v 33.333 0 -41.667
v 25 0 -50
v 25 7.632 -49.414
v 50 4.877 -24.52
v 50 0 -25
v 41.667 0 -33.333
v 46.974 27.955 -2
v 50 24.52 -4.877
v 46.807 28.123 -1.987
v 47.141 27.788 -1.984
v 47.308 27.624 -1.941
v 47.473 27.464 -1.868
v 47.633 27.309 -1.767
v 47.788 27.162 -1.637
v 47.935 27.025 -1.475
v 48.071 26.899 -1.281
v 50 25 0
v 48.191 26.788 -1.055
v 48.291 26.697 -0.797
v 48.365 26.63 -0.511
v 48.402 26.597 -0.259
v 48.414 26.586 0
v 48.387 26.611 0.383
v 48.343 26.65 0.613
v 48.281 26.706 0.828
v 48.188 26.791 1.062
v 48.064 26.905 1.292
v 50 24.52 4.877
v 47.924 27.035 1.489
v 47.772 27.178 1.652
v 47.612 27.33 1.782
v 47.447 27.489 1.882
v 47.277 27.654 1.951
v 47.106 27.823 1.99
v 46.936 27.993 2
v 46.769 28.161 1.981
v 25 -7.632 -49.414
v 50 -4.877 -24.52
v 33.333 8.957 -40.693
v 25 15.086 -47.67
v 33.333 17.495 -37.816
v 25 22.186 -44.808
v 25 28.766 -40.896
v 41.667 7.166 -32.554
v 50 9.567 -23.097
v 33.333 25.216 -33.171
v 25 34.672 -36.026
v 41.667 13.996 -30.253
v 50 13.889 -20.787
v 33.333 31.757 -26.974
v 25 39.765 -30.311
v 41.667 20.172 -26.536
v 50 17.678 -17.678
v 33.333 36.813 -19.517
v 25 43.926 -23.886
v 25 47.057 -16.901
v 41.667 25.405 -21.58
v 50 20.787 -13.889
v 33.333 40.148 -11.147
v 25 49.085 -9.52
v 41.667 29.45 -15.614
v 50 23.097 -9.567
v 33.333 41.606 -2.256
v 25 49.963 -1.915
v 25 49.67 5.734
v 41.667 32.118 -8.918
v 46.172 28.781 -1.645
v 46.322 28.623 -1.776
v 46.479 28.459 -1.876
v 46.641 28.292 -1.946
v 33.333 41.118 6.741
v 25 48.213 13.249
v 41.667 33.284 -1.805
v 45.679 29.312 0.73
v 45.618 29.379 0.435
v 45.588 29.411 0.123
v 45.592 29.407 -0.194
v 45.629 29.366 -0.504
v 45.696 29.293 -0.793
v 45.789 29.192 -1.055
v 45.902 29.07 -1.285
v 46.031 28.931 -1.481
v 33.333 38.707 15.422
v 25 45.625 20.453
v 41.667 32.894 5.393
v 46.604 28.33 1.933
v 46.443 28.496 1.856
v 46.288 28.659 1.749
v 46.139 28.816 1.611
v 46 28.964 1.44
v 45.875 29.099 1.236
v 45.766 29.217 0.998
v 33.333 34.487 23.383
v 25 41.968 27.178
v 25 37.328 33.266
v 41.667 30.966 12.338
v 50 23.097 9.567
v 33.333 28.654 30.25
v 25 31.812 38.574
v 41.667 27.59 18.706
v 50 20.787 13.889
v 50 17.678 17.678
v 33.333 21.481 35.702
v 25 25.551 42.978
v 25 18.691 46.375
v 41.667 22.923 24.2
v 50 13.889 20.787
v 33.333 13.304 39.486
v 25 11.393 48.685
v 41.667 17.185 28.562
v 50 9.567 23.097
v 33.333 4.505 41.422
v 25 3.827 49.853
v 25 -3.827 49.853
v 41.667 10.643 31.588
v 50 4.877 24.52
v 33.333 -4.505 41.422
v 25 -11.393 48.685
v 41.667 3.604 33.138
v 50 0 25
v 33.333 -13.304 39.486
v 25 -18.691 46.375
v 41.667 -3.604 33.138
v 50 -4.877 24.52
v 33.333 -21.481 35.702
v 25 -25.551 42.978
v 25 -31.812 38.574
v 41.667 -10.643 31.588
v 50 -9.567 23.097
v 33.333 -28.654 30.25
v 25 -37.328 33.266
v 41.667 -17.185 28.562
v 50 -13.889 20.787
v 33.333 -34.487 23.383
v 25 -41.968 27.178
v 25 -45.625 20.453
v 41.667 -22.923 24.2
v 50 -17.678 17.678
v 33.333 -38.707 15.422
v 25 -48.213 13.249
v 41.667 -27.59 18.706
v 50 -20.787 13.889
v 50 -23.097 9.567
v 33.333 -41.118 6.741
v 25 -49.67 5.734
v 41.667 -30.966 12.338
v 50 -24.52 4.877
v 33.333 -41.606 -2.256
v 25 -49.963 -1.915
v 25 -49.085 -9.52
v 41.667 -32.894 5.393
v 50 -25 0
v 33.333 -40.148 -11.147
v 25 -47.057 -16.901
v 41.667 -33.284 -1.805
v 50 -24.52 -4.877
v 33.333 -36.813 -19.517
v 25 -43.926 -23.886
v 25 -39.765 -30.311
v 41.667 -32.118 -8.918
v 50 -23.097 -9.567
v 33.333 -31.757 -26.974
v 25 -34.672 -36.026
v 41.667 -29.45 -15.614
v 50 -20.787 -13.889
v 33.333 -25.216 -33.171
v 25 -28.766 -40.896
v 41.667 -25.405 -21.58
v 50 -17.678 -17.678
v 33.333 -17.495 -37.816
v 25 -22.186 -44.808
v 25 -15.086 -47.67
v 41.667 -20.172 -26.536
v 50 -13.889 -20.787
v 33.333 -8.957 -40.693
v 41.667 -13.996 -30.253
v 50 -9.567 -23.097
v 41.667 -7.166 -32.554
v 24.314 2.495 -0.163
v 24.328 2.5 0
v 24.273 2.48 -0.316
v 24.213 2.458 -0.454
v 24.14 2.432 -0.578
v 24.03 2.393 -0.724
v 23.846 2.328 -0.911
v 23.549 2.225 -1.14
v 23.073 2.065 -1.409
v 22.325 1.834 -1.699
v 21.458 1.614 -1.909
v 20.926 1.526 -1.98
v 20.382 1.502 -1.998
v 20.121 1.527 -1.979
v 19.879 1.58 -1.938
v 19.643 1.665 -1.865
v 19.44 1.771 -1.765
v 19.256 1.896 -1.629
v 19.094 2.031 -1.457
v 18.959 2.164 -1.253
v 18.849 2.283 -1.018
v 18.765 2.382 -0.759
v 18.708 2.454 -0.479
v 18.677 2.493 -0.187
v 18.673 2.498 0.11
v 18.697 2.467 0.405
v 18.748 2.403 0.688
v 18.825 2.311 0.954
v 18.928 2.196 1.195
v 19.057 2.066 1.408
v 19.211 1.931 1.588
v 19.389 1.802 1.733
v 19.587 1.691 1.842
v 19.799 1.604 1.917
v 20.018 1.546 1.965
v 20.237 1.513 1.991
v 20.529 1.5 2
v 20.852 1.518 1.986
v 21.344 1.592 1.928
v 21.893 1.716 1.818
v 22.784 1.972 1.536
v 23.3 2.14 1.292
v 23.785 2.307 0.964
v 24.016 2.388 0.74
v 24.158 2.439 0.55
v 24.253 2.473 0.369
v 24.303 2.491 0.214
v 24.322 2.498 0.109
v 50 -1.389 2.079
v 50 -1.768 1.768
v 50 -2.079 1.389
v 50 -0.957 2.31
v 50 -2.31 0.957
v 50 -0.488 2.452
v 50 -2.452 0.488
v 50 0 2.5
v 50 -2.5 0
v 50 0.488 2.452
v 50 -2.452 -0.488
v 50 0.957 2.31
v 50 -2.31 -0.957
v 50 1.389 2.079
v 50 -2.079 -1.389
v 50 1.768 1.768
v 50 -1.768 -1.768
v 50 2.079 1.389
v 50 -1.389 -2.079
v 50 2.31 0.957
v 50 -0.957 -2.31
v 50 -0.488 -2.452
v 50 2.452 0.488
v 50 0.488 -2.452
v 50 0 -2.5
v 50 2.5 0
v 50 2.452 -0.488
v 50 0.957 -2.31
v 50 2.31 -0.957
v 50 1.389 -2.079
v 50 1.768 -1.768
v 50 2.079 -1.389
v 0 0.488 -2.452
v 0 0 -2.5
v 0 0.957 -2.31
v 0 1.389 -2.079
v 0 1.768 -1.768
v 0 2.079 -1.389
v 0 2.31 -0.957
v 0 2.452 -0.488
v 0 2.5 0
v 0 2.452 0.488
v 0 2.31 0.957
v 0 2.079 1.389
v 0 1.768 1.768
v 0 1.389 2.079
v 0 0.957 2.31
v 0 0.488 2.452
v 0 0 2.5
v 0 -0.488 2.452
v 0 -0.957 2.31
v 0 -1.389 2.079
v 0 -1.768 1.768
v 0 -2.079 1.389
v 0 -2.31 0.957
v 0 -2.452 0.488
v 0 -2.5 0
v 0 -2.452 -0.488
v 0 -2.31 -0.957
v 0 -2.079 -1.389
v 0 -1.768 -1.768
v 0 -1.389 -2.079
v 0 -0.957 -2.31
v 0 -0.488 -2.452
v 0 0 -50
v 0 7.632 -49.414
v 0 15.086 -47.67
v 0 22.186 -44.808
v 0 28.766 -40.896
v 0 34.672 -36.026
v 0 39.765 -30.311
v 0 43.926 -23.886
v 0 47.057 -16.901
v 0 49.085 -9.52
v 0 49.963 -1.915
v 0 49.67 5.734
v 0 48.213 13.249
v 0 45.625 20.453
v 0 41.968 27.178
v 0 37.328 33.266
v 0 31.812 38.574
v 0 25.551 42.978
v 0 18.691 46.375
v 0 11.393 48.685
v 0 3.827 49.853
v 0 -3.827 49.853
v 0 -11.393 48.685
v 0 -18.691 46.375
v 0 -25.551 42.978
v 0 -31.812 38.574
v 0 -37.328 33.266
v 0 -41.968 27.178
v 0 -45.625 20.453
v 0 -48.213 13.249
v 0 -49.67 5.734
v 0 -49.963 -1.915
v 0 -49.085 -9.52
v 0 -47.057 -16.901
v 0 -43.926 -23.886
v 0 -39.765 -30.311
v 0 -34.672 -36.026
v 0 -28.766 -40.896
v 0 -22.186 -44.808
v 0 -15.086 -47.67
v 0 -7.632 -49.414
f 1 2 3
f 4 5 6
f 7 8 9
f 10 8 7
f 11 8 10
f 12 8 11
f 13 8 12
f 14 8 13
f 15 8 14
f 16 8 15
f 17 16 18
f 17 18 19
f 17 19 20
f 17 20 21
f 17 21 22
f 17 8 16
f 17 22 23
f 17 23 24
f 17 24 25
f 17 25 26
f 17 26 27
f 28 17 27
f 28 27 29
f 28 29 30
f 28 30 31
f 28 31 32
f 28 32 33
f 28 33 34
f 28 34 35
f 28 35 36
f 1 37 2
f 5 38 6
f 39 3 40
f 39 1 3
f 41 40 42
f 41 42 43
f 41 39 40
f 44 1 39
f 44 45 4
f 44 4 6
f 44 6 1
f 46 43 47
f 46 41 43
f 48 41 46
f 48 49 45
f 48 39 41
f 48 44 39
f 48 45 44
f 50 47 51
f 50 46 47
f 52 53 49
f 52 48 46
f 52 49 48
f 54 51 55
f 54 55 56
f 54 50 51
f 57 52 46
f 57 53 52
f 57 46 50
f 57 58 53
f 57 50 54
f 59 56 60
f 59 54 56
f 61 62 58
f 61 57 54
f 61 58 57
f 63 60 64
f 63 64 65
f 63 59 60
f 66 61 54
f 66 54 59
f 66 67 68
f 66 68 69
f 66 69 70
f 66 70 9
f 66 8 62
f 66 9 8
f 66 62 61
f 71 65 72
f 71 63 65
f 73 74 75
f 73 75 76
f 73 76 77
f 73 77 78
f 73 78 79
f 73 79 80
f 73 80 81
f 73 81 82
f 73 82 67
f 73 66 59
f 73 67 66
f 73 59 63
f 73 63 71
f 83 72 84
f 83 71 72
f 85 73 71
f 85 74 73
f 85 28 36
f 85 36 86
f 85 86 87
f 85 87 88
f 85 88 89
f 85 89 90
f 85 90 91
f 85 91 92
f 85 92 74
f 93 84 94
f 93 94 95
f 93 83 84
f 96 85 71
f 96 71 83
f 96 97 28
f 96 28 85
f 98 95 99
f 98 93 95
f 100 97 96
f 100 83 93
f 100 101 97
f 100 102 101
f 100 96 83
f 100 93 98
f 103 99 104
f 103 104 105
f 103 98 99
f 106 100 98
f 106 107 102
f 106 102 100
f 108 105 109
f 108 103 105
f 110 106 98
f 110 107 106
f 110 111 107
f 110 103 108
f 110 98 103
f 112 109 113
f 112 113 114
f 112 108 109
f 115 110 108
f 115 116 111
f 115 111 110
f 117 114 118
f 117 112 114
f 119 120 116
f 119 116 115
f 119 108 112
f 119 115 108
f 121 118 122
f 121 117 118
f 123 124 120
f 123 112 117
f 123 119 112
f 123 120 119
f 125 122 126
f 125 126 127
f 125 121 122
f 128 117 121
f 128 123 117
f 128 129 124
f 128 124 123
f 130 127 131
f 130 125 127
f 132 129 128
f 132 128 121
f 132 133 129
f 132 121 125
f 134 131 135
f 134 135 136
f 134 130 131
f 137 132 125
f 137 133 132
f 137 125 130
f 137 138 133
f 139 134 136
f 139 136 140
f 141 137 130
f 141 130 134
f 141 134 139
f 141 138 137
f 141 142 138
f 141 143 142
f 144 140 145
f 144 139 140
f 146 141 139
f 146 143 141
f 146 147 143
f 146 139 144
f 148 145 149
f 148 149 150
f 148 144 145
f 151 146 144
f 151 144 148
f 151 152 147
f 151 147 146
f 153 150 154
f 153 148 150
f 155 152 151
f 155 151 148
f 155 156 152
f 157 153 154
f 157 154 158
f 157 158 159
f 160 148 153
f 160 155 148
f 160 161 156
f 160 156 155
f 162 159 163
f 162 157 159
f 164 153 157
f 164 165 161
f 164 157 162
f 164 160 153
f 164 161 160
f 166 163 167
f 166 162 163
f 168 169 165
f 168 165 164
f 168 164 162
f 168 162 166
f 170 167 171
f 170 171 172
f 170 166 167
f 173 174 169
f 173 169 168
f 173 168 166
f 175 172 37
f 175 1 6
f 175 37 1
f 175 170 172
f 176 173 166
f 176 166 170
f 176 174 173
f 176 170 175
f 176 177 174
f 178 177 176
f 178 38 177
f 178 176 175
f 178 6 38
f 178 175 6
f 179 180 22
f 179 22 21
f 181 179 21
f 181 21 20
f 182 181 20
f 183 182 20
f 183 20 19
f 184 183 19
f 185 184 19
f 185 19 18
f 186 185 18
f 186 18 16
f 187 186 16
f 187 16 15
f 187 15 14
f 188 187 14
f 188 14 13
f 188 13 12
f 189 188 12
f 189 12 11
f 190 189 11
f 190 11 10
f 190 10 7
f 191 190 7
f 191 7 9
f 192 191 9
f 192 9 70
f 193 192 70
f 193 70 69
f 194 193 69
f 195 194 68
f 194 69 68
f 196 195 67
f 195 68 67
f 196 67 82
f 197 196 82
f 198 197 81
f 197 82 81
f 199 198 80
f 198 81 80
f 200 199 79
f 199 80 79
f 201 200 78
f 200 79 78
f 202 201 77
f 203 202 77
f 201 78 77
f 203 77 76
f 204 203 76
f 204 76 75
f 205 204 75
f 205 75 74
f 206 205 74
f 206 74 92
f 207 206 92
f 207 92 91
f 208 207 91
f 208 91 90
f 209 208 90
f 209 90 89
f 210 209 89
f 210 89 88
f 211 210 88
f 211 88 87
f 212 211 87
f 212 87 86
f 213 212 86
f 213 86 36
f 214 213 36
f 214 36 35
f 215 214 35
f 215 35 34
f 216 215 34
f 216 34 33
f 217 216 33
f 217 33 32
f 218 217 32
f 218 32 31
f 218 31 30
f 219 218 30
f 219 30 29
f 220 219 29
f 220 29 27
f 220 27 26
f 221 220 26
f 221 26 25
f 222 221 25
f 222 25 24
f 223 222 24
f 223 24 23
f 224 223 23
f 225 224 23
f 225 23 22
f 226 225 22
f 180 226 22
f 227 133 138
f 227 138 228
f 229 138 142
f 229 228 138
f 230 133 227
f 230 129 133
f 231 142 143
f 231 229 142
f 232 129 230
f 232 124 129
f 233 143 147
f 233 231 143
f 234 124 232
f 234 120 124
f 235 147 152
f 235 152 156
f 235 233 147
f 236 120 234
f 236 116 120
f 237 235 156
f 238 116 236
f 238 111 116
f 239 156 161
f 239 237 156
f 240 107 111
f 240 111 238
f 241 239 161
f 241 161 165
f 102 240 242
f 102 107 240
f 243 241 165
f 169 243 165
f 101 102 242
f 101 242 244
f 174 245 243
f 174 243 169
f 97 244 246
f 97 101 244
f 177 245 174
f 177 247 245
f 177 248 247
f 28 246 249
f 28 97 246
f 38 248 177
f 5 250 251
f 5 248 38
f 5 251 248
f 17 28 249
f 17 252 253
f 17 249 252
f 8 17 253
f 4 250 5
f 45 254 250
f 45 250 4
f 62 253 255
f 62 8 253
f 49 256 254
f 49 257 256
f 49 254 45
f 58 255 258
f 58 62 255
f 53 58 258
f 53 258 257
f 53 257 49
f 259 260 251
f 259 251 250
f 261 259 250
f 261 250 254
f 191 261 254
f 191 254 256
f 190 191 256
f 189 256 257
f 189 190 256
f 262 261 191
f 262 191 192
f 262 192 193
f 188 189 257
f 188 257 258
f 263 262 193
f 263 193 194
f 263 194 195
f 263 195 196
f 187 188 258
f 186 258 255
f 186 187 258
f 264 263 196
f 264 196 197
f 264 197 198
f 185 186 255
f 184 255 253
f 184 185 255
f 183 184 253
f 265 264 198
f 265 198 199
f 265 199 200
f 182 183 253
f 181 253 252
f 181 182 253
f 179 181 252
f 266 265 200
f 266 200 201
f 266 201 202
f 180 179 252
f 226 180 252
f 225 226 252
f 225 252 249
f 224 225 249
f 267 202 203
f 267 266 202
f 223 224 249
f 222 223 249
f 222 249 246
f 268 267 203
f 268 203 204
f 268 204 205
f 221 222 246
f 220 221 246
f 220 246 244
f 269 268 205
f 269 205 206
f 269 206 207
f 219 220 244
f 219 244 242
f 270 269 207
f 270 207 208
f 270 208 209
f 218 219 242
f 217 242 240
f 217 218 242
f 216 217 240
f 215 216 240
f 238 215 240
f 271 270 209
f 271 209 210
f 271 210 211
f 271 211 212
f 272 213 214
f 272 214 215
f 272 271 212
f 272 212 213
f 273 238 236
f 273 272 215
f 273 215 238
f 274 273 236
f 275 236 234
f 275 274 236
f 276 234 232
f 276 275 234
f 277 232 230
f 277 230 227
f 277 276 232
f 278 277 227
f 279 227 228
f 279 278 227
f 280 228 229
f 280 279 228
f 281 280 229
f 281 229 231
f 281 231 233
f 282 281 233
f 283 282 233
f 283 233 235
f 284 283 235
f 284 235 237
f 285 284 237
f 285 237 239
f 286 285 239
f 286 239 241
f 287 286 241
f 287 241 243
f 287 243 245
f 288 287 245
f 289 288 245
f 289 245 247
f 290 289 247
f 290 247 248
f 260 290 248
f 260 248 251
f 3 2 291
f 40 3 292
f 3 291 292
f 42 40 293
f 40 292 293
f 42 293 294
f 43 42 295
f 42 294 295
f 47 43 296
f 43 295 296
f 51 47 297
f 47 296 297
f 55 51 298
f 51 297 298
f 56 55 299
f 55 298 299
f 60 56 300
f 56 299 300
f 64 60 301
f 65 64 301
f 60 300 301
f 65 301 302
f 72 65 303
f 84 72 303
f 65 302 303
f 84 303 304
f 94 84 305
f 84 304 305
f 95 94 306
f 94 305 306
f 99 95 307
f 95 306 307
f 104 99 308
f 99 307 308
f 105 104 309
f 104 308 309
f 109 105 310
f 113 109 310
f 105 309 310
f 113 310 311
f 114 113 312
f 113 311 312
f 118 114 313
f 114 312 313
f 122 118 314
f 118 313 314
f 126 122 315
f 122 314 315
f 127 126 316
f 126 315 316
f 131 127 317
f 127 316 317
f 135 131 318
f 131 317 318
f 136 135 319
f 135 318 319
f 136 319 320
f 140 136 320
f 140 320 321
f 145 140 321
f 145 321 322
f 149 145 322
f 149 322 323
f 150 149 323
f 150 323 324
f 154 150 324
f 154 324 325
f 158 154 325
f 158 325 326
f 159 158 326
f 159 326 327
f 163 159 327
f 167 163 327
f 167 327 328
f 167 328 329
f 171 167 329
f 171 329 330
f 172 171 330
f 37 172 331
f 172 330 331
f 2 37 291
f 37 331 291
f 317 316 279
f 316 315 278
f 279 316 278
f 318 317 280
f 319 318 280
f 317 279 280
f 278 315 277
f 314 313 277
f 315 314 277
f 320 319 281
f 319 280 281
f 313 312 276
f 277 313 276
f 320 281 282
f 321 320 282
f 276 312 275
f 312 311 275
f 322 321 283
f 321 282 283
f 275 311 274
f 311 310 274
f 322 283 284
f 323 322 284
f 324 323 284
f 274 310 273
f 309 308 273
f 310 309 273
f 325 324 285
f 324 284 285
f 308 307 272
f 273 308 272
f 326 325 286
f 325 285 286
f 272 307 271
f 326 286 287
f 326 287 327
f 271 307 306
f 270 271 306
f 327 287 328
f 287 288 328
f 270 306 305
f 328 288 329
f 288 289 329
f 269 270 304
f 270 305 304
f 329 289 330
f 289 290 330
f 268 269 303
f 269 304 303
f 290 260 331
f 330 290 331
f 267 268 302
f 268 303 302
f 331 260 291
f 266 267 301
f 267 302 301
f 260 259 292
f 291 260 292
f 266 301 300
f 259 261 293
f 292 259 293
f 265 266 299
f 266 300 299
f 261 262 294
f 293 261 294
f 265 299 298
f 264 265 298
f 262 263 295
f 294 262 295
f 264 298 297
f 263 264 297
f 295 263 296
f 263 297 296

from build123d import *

# Parameters (mm, degrees)
SKIZZE1_R                           = 50
SKIZZE1_R_2                         = 2.5
AUFSATZ_LINEAR_AUSTRAGEN1_DEPTH     = 50
FASE1_SIZE                          = 25
F_4_0_4_DURCHMESSER_BOHRUNG1_REACH  = 90.388
F_4_0_4_DURCHMESSER_BOHRUNG1_BORE_R = 2


with BuildPart() as part:
    # Skizze1 → Aufsatz-Linear austragen1 (new body)
    with BuildSketch(Plane(origin=(0, 0, 0), x_dir=(0, 0, -1), z_dir=(1, 0, 0))):
        Circle(SKIZZE1_R)
        Circle(SKIZZE1_R_2, mode=Mode.SUBTRACT)
    extrude(amount=AUFSATZ_LINEAR_AUSTRAGEN1_DEPTH)

    # Fase1
    fase1_edges = [part.edges().sort_by_distance(p)[0] for p in [
        (50, 0, 50),
    ]]
    chamfer(fase1_edges, length=FASE1_SIZE)

    # Ø4.0 (4) Durchmesser Bohrung1 bore (on position points) → Ø4.0 (4) Durchmesser Bohrung1 (cut, up to next)
    with BuildSketch(Plane(origin=(47, 28, 0), x_dir=(0.707106781, -0.707106781, 0), z_dir=(0.707106781, 0.707106781, 0)), mode=Mode.PRIVATE) as f_4_0_4_durchmesser_bohrung1_sk1:
        Circle(F_4_0_4_DURCHMESSER_BOHRUNG1_BORE_R)
    f_4_0_4_durchmesser_bohrung1_tool1 = extrude(f_4_0_4_durchmesser_bohrung1_sk1.sketch, amount=-F_4_0_4_DURCHMESSER_BOHRUNG1_REACH, mode=Mode.PRIVATE) & part.part
    add(f_4_0_4_durchmesser_bohrung1_tool1.solids().sort_by_distance((47, 28, 0))[0], mode=Mode.SUBTRACT)


solid = part.part
